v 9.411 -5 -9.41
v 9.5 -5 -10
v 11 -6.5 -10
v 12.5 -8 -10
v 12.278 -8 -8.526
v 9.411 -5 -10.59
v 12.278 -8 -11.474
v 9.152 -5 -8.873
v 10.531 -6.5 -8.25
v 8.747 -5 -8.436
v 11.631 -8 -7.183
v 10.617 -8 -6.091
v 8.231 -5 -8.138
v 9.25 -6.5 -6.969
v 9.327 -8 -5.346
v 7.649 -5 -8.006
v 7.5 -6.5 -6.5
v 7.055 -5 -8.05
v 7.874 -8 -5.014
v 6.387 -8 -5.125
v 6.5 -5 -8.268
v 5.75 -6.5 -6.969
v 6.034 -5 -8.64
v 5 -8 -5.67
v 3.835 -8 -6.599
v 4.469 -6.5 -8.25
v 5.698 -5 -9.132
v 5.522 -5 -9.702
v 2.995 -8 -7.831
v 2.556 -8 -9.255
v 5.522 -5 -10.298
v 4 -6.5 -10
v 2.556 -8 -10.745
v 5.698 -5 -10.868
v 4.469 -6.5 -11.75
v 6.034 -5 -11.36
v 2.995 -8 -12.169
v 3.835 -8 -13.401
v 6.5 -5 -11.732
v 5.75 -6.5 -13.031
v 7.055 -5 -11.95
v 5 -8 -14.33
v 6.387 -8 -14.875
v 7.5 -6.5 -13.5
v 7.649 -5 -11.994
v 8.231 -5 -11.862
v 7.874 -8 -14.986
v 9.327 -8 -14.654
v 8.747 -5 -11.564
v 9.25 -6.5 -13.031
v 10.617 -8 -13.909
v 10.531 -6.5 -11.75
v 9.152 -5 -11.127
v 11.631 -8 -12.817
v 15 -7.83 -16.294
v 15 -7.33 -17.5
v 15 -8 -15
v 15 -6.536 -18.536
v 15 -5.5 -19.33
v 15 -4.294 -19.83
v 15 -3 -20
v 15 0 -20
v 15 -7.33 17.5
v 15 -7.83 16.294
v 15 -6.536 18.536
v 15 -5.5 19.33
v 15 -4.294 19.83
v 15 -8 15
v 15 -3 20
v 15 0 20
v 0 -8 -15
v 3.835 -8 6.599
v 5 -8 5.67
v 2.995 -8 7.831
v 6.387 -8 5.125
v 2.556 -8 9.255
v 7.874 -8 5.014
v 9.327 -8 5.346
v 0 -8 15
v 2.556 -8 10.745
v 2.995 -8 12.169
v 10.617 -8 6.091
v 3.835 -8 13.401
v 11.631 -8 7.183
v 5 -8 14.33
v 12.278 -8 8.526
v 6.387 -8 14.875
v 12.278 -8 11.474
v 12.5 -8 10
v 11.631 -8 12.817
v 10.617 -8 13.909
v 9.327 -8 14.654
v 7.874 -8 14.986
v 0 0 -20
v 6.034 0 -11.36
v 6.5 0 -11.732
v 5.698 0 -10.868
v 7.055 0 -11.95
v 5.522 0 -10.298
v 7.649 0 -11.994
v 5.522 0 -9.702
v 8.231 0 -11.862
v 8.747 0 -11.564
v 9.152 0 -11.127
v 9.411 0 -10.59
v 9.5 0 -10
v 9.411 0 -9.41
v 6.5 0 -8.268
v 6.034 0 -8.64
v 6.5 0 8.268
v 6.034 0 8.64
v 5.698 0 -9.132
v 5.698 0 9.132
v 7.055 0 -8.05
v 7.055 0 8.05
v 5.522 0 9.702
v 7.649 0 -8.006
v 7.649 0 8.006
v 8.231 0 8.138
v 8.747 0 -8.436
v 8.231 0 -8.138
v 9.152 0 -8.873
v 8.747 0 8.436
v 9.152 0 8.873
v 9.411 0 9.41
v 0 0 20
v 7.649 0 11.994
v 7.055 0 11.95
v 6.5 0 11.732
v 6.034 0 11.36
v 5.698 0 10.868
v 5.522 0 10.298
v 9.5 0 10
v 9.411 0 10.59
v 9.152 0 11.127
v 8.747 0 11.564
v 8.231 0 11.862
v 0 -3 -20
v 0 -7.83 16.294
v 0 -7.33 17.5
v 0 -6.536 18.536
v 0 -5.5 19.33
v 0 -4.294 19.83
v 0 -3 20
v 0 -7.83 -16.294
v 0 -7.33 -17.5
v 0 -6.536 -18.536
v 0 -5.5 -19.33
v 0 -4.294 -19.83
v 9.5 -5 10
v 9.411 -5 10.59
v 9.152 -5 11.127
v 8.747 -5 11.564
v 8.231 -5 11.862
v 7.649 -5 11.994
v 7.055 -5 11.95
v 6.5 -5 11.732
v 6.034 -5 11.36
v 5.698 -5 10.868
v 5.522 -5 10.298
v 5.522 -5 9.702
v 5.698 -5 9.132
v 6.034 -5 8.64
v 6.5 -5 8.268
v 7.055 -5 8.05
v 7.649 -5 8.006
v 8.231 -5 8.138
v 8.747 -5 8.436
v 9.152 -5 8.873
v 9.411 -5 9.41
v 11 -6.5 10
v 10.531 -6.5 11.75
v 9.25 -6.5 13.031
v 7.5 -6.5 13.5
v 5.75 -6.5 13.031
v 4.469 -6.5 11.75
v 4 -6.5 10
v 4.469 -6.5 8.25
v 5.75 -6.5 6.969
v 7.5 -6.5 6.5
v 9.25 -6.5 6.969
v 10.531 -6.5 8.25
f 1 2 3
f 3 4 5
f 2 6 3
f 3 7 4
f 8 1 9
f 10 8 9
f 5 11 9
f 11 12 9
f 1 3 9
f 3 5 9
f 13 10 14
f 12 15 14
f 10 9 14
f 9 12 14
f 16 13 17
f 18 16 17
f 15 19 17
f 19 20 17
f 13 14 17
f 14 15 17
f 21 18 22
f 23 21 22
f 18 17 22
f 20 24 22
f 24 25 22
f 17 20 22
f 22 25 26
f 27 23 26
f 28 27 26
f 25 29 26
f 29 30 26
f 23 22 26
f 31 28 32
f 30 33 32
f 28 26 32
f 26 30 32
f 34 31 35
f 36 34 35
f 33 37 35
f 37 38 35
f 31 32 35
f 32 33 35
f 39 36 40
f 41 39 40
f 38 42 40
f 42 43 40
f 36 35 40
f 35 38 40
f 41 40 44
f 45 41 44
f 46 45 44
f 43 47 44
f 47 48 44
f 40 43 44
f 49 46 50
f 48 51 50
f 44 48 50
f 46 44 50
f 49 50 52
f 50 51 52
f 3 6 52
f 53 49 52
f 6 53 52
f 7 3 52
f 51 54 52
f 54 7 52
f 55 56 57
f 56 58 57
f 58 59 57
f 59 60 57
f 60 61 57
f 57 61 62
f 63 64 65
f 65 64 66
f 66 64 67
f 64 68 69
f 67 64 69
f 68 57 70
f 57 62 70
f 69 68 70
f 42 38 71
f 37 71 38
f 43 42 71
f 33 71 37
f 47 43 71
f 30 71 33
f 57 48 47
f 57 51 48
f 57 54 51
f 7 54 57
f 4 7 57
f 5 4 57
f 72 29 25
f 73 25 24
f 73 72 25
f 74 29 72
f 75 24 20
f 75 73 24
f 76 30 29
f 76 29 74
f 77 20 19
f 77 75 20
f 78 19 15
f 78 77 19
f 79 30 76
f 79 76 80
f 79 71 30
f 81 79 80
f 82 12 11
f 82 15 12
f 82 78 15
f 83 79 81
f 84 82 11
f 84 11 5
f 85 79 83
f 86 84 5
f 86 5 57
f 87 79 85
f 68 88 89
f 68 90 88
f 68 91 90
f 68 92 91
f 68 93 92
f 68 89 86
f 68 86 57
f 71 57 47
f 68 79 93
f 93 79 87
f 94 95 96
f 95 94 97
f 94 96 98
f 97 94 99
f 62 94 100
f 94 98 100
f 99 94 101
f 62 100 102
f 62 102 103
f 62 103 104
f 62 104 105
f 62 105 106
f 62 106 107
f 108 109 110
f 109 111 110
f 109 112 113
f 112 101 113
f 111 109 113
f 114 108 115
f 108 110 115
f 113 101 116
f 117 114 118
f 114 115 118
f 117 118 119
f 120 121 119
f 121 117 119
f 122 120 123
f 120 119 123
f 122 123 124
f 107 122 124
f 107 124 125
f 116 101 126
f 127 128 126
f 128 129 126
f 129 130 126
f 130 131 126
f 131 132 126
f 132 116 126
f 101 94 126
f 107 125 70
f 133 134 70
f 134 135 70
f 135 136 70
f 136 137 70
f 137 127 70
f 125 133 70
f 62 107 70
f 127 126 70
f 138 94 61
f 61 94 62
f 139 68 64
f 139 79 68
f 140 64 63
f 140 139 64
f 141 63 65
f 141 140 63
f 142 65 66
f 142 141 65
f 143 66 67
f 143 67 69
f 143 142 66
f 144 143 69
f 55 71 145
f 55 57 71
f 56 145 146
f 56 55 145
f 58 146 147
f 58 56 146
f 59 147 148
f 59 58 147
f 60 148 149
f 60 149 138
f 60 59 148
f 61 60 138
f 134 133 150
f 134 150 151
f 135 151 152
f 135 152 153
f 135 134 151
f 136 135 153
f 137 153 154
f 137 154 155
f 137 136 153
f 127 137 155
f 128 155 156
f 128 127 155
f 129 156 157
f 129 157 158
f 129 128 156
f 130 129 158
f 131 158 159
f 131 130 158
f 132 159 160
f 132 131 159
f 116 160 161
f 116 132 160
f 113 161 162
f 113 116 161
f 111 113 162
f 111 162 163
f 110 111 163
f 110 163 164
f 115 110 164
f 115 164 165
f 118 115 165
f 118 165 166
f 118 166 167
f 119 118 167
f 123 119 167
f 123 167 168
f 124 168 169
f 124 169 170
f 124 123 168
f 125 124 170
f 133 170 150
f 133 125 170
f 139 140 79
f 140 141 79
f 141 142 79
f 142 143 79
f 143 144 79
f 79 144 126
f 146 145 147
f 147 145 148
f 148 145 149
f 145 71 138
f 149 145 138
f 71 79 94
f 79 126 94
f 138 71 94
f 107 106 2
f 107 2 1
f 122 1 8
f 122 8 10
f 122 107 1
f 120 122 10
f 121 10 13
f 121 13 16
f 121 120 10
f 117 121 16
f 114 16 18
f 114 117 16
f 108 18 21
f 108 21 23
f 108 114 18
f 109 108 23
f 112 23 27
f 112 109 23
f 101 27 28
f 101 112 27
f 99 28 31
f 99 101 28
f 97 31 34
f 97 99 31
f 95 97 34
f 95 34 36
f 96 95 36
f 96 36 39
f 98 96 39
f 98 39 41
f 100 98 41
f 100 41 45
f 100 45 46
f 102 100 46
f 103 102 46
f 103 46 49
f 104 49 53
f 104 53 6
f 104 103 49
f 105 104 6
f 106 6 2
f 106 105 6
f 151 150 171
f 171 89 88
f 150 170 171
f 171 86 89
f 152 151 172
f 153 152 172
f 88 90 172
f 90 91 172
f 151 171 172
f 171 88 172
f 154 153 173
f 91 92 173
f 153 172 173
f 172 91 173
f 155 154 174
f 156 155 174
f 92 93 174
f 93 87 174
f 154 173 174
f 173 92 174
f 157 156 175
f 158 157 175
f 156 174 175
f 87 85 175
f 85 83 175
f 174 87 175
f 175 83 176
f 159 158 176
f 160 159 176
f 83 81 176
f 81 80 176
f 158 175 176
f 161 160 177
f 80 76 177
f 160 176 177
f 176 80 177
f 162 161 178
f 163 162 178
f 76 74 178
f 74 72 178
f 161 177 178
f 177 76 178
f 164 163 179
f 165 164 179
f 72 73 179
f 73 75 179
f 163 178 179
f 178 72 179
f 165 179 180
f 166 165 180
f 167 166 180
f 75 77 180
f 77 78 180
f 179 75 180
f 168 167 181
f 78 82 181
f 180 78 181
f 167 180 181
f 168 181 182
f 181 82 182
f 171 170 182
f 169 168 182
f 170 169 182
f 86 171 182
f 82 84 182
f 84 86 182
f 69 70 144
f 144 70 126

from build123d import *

# Parameters (mm, degrees)
F0_R     = 2
F1_DEPTH = 8
F2_SIZE  = 3
F3_R     = 4.99999


# Not quite as in the source:
# - a fillet or chamfer is up to 0.001 mm smaller than in the source, because OpenCascade refuses the exact size


with BuildPart() as f1:
    # F0 (on Front) → F1 (new body)
    with BuildSketch(Plane.XZ):
        Polygon((0, 20), (0, 0), (0, -20), (15, -20), (15, 0), (15, 20), align=None)
        with Locations((7.5, -10)):
            Circle(F0_R, mode=Mode.SUBTRACT)
        with Locations((7.5, 10)):
            Circle(F0_R, mode=Mode.SUBTRACT)
    extrude(amount=F1_DEPTH)

    # F2
    f2_edges = [f1.edges().sort_by_distance(p)[0] for p in [
        (5.5, -8, 10),
        (5.5, -8, -10),
    ]]
    chamfer(f2_edges, length=F2_SIZE)

    # F3 (radius 5 in the source; OpenCascade refuses exactly that, so slightly less here)
    f3_edges = [f1.edges().sort_by_distance(p)[0] for p in [
        (7.5, -8, 20),
        (7.5, -8, -20),
    ]]
    fillet(f3_edges, radius=F3_R)


solid = f1.part
